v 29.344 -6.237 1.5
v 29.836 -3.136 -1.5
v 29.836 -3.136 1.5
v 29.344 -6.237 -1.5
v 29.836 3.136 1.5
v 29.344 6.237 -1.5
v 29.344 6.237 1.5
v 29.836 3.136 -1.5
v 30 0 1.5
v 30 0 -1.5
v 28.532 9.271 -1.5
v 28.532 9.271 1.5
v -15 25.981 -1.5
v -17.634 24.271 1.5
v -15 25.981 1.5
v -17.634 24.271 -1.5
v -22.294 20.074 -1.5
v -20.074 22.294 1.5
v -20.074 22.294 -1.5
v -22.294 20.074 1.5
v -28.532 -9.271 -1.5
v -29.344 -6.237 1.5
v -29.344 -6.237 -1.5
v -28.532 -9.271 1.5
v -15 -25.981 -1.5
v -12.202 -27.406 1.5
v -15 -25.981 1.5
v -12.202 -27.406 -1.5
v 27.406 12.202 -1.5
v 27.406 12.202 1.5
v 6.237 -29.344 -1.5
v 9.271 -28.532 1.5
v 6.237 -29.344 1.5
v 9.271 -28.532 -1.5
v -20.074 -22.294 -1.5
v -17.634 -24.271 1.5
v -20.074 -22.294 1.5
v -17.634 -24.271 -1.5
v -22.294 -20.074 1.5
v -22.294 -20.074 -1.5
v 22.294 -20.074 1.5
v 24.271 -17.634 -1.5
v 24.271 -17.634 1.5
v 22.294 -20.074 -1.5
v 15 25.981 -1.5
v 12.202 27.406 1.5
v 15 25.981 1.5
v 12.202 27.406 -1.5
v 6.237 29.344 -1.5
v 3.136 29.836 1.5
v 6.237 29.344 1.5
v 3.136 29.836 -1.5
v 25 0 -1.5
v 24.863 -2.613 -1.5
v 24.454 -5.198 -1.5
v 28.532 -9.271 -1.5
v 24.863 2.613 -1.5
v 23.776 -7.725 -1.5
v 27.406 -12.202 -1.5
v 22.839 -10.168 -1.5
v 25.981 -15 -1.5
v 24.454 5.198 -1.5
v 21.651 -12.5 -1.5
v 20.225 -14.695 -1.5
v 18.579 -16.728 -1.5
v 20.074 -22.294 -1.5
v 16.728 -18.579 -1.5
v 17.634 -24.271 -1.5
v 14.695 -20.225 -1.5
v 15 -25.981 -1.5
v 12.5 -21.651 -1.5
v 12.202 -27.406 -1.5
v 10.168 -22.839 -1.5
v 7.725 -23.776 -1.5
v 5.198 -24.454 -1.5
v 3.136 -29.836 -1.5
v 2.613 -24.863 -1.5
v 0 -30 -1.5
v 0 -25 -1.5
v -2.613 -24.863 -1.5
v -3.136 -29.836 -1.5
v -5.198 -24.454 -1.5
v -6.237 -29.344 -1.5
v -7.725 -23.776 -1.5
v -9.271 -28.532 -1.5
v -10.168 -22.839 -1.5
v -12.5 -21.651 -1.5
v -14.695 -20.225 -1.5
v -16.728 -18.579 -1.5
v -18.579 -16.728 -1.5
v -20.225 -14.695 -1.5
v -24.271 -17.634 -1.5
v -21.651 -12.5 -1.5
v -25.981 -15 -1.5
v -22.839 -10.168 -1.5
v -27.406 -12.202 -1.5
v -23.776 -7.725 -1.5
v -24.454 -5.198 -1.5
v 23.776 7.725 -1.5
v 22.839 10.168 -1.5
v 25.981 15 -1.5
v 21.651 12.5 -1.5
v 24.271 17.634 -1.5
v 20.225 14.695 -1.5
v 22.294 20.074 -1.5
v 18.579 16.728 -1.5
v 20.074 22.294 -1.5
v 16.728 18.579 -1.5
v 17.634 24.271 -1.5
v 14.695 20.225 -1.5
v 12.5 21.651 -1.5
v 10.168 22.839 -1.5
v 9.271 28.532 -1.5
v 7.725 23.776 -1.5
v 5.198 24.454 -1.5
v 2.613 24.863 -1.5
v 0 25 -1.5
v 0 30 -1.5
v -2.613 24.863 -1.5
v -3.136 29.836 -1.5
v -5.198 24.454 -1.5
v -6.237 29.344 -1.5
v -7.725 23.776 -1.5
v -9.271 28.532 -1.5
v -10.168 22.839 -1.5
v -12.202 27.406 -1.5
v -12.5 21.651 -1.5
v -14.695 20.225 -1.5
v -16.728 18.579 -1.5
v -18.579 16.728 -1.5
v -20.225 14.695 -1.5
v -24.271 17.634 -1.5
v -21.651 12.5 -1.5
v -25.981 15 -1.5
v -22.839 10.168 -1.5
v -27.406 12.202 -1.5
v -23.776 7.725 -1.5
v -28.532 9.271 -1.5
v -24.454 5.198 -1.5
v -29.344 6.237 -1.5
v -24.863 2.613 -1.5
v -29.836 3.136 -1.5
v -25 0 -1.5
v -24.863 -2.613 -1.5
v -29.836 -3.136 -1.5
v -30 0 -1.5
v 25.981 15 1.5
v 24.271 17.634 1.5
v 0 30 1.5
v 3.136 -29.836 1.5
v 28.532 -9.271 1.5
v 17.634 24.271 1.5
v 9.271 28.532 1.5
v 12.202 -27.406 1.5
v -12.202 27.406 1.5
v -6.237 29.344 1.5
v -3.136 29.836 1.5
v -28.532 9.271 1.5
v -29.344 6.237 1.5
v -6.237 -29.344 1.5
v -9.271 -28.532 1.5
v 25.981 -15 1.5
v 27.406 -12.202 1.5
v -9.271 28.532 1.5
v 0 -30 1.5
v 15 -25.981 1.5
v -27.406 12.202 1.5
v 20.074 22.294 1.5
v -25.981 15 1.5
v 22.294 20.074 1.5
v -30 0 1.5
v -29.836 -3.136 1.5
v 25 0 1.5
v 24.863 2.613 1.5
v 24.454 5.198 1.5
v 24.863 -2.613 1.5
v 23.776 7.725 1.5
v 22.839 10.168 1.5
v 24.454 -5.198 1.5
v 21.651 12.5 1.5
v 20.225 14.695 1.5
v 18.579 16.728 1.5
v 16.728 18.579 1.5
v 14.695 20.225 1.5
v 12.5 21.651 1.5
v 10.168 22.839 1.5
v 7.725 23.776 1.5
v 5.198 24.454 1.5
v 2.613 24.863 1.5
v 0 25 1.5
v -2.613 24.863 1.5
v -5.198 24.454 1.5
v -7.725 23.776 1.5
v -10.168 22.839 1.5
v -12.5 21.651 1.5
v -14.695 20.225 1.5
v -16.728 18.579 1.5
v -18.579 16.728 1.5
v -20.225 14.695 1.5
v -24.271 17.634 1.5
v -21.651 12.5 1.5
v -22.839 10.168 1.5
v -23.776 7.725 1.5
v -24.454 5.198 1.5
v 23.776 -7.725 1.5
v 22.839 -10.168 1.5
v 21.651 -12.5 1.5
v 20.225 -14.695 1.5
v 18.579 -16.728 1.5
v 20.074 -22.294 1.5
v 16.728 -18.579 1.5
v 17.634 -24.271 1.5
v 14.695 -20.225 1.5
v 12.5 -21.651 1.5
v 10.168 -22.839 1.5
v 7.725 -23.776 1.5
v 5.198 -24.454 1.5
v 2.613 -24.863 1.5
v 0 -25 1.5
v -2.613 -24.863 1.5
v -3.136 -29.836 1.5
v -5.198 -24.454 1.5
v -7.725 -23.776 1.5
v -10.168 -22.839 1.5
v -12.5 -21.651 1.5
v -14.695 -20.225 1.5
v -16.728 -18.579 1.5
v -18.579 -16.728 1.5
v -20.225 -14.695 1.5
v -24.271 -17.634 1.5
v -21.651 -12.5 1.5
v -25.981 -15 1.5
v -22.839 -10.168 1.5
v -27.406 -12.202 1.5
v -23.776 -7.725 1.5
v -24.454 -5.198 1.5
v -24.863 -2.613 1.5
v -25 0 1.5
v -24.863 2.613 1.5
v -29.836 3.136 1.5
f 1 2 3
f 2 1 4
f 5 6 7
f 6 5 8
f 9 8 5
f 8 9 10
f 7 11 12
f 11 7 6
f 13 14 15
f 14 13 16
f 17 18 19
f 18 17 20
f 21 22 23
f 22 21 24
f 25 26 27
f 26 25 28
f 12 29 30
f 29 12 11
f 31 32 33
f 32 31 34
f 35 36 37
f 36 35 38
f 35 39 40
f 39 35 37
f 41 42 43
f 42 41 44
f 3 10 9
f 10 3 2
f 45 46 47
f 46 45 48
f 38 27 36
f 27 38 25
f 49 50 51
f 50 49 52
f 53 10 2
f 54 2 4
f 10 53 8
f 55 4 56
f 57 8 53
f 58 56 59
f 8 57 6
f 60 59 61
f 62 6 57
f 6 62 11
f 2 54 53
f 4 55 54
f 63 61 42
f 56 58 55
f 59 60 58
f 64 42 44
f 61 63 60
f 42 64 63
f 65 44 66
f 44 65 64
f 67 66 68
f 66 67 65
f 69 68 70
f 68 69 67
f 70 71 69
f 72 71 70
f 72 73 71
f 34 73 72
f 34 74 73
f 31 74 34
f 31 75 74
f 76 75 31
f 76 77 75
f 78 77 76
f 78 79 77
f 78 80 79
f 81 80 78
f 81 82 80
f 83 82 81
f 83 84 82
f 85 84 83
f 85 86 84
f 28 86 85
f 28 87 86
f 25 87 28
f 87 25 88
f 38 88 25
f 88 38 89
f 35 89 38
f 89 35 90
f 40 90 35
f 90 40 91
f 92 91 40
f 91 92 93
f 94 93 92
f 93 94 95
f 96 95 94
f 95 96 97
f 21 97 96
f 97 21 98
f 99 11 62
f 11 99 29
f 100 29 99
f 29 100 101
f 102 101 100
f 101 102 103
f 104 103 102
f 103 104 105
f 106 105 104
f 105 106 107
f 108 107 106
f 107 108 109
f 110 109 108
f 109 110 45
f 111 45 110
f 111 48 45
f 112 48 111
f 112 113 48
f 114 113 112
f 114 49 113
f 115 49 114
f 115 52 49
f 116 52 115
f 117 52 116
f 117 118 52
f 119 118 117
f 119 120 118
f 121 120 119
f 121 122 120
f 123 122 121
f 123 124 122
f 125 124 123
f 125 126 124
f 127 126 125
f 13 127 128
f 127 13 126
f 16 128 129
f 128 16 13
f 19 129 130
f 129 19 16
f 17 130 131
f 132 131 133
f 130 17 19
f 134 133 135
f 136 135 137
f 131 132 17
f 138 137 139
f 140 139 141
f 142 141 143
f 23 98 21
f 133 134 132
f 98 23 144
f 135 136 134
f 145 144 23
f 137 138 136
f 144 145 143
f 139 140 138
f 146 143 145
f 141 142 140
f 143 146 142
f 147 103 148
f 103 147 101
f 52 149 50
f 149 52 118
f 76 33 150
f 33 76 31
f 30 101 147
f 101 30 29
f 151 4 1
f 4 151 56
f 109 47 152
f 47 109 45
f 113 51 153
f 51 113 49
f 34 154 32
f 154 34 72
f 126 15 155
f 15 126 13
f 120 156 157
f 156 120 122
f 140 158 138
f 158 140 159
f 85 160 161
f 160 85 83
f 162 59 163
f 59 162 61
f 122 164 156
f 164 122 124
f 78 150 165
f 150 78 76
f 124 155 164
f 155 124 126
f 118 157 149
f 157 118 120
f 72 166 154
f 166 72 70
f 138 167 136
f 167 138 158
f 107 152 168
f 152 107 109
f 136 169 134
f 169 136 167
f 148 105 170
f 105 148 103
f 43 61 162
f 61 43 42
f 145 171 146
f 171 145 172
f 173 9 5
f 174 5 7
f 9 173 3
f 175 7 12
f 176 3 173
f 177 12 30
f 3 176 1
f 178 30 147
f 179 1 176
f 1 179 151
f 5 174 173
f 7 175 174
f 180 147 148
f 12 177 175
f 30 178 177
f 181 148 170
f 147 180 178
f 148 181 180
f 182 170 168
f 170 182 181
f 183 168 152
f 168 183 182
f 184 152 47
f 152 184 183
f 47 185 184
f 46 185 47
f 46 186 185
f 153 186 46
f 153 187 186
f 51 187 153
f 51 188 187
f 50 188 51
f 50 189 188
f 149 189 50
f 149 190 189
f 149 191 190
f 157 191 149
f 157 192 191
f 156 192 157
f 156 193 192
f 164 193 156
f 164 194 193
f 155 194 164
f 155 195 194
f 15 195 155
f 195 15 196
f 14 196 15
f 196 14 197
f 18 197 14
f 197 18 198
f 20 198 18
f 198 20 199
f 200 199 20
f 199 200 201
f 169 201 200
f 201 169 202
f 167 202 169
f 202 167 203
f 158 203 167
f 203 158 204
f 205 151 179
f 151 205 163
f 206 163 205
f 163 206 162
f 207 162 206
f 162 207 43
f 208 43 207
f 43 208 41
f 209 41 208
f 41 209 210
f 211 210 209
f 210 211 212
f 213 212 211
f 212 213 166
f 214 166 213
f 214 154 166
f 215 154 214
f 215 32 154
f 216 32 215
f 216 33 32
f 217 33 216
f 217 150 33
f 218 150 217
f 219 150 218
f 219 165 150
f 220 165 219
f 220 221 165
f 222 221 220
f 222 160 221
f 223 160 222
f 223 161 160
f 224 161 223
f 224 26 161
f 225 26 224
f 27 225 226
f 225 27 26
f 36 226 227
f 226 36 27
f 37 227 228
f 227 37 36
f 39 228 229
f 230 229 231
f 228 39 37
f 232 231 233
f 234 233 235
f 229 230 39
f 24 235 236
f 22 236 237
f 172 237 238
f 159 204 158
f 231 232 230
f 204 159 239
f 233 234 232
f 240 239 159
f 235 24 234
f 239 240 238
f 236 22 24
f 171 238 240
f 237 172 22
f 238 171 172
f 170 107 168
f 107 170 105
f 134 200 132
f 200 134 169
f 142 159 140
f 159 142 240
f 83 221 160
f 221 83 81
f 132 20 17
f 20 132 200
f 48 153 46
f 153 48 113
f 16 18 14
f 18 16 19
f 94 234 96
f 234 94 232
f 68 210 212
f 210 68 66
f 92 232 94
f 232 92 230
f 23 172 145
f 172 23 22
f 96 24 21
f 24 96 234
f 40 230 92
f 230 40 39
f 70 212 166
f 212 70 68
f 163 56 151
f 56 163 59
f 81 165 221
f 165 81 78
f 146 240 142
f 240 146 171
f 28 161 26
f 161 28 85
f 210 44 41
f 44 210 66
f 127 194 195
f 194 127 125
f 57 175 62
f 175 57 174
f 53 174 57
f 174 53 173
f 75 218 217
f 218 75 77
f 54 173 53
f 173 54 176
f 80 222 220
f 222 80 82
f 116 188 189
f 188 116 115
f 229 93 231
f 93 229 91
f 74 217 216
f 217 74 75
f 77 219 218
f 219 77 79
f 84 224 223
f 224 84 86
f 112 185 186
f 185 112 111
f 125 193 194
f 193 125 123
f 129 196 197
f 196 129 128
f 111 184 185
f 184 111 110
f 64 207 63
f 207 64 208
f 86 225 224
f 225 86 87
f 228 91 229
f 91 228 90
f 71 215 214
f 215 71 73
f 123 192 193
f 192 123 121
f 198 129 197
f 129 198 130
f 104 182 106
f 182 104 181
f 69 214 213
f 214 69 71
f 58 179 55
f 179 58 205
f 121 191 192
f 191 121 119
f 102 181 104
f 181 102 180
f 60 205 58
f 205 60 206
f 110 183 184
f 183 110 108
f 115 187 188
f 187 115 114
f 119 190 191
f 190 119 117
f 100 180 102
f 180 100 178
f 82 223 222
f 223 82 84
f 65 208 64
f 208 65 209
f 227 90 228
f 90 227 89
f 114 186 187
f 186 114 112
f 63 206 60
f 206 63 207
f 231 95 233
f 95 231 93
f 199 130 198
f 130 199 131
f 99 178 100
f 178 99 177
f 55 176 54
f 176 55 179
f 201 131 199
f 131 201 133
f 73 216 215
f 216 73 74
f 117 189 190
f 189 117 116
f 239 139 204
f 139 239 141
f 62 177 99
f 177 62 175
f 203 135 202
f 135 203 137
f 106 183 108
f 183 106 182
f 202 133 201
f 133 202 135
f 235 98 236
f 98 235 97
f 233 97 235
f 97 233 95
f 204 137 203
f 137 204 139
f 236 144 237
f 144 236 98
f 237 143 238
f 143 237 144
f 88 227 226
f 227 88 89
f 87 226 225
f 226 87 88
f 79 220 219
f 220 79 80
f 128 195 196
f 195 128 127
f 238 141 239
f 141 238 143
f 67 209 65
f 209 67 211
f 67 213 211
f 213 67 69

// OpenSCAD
// ring
difference(){
  // outer
  translate(v=[0, 0, -1.5])
    cylinder(h=3, d1=60, d2=60, $fa=6, $fs=0.5);
  // inner
  translate(v=[0, 0, -1.55])
    cylinder(h=3.1, d1=50, d2=50, $fa=6, $fs=0.5);
}
